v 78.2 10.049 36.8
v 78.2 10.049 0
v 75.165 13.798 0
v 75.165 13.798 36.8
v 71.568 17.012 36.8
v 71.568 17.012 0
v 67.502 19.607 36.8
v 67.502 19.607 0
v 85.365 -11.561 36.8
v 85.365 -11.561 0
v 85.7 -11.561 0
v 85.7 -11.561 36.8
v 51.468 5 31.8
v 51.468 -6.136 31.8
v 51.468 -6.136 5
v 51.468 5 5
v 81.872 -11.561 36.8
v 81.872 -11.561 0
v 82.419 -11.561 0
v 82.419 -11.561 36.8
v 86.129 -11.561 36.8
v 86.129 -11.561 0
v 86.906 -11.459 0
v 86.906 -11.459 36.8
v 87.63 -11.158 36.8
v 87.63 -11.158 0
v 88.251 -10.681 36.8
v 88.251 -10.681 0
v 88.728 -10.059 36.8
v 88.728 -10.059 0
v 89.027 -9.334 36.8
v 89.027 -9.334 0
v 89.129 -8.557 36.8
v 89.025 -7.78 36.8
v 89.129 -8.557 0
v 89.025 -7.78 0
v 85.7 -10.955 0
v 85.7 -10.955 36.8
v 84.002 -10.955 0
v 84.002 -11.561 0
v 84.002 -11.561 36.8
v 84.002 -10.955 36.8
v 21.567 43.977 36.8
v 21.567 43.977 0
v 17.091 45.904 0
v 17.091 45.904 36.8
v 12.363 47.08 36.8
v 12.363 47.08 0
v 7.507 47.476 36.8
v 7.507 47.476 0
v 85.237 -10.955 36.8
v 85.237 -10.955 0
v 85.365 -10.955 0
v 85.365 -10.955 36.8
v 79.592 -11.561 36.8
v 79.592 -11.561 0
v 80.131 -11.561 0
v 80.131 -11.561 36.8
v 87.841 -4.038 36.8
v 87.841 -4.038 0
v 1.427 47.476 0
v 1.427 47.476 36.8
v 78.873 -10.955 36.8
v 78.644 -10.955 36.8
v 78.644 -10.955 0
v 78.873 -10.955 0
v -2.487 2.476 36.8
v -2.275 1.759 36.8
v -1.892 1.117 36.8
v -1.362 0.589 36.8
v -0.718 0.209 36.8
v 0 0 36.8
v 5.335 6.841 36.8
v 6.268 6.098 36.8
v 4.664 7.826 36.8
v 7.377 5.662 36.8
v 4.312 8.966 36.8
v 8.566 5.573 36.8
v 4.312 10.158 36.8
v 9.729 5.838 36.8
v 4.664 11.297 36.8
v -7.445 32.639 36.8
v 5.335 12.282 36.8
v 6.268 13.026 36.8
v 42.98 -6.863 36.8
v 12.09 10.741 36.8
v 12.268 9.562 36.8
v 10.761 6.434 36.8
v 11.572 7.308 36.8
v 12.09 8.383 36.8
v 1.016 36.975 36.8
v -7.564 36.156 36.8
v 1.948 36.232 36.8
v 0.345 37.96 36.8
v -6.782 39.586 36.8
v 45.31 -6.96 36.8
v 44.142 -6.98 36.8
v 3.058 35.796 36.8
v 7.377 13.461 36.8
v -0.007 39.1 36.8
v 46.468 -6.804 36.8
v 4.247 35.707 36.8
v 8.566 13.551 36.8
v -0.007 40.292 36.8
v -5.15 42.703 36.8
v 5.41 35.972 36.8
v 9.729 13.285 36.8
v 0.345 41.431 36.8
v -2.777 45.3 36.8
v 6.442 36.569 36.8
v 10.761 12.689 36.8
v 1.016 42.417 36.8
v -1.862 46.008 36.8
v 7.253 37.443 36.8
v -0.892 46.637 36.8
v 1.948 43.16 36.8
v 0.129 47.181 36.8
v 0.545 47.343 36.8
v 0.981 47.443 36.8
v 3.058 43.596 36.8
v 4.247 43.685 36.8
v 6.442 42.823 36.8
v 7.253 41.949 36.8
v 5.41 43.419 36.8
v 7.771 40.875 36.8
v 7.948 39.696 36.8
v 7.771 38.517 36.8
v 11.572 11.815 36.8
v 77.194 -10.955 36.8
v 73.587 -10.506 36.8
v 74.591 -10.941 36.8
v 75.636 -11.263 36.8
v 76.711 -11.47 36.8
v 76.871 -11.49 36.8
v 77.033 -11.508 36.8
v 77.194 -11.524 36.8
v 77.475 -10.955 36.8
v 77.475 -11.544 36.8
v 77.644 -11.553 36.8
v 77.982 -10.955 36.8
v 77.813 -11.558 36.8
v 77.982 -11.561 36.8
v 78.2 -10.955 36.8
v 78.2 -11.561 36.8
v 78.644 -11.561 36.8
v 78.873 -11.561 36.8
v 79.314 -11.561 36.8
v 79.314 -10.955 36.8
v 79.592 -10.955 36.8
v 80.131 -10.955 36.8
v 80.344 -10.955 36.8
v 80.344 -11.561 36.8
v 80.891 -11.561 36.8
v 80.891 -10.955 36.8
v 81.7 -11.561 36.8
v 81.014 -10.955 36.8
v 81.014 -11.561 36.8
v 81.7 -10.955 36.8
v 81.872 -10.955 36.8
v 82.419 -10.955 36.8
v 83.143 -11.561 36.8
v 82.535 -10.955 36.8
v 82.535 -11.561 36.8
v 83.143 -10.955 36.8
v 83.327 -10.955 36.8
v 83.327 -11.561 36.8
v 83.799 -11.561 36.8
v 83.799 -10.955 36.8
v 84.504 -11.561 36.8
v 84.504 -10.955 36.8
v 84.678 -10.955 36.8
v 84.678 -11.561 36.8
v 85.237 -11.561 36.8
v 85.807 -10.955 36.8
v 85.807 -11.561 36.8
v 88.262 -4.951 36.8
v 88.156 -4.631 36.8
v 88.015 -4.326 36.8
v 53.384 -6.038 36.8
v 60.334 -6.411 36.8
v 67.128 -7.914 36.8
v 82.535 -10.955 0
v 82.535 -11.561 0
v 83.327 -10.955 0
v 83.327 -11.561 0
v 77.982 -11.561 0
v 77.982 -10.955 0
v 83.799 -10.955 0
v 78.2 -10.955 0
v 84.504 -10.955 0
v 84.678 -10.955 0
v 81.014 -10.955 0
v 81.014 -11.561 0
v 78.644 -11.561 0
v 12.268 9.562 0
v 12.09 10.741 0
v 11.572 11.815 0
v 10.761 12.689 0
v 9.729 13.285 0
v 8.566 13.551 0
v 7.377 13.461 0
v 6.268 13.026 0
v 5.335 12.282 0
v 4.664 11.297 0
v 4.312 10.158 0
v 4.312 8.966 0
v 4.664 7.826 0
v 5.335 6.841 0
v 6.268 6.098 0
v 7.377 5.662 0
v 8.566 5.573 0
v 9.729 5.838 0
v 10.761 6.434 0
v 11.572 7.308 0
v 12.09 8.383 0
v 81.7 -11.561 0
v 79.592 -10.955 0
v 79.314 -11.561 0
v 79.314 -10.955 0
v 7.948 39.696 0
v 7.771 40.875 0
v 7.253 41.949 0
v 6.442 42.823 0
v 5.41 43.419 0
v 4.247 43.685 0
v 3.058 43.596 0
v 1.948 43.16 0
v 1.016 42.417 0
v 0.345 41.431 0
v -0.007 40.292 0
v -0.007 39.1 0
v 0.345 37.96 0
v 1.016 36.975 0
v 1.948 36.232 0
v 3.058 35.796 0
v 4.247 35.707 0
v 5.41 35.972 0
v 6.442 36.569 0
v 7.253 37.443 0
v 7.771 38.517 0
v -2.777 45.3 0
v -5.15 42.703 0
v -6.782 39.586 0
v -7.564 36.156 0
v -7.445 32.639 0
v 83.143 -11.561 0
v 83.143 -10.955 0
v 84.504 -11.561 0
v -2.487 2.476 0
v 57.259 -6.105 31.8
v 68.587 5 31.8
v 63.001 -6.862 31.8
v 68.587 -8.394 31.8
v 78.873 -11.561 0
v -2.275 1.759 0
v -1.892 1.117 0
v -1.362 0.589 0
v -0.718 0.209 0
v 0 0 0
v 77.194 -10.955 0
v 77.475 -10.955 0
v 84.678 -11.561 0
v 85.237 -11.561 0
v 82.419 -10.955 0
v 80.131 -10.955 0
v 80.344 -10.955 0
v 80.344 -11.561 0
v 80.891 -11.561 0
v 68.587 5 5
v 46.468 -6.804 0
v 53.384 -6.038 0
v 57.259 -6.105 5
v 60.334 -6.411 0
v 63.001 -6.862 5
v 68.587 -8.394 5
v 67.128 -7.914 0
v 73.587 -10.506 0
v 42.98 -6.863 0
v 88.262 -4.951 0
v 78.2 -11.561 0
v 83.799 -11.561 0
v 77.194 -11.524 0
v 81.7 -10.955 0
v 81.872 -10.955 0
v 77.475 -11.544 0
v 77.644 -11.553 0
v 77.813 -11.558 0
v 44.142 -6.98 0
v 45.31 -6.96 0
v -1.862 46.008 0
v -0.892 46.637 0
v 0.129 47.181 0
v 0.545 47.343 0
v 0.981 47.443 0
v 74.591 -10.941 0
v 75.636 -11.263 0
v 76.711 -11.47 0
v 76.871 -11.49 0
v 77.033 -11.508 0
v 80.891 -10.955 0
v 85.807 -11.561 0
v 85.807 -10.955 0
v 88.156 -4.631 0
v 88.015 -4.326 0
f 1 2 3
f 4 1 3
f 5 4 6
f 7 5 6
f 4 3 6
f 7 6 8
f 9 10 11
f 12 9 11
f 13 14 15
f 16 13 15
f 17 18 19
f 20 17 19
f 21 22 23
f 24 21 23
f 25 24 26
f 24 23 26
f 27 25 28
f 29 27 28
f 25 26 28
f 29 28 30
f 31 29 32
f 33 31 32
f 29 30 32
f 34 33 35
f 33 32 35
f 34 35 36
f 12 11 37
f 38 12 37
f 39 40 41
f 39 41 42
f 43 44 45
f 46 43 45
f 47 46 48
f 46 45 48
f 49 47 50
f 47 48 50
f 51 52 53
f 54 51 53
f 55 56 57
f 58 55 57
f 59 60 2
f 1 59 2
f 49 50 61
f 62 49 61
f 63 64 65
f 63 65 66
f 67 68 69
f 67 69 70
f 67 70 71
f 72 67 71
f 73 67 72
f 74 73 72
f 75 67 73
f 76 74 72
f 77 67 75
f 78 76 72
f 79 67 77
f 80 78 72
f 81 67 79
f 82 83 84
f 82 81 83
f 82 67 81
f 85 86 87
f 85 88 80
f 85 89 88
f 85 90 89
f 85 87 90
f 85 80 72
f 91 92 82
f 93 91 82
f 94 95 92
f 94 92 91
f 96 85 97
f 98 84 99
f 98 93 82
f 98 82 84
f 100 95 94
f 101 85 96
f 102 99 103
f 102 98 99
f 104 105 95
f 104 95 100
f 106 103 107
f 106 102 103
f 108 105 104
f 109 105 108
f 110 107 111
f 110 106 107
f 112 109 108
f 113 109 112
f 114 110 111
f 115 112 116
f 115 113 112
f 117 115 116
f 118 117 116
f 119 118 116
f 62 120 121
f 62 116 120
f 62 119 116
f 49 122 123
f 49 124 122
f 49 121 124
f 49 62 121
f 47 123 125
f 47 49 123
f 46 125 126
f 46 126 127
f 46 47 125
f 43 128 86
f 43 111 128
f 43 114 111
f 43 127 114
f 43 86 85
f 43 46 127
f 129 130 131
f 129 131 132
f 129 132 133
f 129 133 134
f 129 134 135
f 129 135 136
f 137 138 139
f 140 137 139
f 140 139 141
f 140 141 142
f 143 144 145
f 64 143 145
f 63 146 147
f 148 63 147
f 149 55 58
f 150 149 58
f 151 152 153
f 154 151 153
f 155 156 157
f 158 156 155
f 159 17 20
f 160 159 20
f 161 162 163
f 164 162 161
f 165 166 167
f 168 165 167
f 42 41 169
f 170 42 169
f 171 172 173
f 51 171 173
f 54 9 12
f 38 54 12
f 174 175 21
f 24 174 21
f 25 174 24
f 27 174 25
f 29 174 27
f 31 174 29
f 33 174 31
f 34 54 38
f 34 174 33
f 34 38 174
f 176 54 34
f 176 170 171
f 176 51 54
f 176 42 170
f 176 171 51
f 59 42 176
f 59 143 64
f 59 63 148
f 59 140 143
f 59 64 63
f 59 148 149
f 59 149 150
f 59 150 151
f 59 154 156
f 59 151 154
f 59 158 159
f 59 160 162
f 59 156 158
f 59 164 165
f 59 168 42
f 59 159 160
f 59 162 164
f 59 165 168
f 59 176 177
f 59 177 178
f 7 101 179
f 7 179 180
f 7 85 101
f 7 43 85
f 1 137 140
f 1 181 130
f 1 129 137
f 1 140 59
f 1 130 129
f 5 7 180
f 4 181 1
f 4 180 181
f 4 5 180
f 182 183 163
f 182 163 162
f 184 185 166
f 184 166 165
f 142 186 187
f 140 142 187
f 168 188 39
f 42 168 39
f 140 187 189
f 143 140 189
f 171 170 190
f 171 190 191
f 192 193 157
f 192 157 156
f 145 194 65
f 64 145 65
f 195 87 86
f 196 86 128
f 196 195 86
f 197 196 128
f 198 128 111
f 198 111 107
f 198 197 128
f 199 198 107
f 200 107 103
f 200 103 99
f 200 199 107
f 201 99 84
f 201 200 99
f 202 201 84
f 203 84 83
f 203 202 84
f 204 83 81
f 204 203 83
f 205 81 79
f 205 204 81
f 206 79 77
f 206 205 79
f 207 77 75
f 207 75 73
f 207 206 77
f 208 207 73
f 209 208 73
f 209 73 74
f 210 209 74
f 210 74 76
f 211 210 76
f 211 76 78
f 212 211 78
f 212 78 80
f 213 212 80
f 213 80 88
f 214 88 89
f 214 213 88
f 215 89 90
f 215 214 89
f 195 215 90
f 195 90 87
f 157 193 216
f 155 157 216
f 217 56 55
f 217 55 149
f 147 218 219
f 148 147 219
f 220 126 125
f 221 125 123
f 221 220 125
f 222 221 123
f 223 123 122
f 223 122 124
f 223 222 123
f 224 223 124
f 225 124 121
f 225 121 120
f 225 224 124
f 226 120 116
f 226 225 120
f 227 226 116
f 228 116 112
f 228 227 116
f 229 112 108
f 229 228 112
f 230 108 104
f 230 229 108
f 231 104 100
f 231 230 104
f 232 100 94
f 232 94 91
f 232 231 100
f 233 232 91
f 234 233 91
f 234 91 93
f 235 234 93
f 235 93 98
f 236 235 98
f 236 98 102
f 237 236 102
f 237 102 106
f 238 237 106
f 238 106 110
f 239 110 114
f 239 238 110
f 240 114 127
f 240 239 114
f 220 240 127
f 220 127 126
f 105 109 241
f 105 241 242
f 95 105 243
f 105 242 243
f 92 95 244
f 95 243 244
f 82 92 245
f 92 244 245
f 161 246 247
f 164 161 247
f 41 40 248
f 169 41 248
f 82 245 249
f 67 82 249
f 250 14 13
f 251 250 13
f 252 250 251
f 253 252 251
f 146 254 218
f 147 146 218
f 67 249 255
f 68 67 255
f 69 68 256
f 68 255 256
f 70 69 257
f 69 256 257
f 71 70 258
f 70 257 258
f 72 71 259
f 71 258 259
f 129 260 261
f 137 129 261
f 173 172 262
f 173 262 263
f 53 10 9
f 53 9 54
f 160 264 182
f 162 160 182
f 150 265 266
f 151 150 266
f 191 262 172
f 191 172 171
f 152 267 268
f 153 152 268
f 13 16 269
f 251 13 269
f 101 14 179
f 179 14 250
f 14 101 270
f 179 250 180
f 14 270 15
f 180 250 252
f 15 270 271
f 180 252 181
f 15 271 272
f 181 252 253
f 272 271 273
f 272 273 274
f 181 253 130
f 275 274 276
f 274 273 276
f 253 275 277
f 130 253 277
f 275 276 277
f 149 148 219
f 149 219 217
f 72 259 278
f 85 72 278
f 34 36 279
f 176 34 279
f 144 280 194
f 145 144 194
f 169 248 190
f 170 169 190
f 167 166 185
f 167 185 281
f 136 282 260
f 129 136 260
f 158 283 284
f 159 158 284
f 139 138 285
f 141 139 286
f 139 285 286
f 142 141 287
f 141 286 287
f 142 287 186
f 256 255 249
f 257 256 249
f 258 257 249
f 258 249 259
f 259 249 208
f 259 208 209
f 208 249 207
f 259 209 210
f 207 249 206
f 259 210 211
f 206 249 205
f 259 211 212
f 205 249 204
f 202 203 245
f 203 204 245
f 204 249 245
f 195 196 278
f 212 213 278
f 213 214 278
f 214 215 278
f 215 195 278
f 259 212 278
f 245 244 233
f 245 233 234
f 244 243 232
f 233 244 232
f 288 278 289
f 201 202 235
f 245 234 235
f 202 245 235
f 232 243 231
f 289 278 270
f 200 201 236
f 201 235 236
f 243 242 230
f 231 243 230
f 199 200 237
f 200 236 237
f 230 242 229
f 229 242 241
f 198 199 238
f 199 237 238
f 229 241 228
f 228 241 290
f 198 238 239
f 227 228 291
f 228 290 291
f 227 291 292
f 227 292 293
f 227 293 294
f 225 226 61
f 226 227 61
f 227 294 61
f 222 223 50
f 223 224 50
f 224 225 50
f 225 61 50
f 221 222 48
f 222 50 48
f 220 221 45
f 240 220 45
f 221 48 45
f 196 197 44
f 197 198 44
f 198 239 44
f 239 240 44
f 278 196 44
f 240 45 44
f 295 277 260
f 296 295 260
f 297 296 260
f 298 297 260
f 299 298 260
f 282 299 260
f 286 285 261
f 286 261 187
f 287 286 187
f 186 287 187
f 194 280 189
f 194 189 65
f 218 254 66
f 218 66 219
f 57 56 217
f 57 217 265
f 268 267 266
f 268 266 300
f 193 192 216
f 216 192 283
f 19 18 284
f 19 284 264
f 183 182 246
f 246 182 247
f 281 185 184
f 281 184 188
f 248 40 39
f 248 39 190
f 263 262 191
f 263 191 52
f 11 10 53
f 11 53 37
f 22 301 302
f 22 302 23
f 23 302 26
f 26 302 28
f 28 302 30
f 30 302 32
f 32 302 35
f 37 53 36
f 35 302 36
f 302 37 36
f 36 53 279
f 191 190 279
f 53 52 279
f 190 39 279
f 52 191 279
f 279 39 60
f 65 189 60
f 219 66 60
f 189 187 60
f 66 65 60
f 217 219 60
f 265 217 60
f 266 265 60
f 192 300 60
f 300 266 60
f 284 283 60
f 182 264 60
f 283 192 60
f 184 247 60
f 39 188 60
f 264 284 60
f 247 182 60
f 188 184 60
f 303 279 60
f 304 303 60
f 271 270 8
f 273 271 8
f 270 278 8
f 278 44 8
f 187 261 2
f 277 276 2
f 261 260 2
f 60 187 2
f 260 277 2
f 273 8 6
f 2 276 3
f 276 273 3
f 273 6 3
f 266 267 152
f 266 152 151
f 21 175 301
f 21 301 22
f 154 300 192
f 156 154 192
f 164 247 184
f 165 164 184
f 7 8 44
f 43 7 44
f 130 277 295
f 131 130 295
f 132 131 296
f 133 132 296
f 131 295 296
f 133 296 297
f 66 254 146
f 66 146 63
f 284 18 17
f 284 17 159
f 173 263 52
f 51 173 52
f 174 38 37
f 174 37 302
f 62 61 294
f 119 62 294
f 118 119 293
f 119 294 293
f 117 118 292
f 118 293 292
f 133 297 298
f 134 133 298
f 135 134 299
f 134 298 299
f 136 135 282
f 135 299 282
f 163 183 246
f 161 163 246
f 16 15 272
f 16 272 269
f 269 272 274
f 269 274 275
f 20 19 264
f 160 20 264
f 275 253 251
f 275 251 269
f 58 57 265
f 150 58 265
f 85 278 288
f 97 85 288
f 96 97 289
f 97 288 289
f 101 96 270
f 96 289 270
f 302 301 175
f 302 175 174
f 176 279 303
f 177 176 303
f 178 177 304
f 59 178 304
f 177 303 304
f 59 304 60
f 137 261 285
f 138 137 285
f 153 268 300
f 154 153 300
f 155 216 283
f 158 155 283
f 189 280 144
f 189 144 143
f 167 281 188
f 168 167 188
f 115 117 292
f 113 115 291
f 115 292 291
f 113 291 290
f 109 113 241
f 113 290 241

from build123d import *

# Parameters (mm, degrees)
SKETCH1_R           = 4
SKETCH1_W           = 0.443674292
SKETCH1_H           = 0.606573965
SKETCH1_W_2         = 0.441272097
SKETCH1_W_3         = 0.539332563
SKETCH1_W_4         = 0.547504268
SKETCH1_W_5         = 0.686423262
SKETCH1_W_6         = 0.607984695
SKETCH1_W_7         = 0.472854348
SKETCH1_W_8         = 0.501804613
SKETCH1_W_9         = 0.559705146
SKETCH1_W_10        = 0.321886919
SKETCH1_W_11        = 0.335329484
BOSS_EXTRUDE1_DEPTH = 36.8
SKETCH2_W           = 17.119195375
SKETCH2_H           = 26.8
CUT_EXTRUDE1_DEPTH  = 45


with BuildPart() as part:
    # Sketch1 → Boss-Extrude1 (new body)
    with BuildSketch(Plane.XY):
        with BuildLine():
            ThreePointArc((-2.487228681, 2.47588145), (-1.643417841, 0.836304882), (0, 0))
            Line((0, 0), (42.98, -6.863043607))
            ThreePointArc((42.98, -6.863043607), (44.726436776, -6.986706153), (46.46767433, -6.803879411))
            ThreePointArc((46.46767433, -6.803879411), (60.333502735, -6.411334854), (73.586869705, -10.505666612))
            ThreePointArc((73.586869705, -10.505666612), (75.109024375, -11.116277731), (76.710514264, -11.469874834))
            Line((76.710514264, -11.469874834), (76.710514264, -10.954571675))
            Line((76.710514264, -10.954571675), (77.19406036, -10.954571675))
            Line((77.19406036, -10.954571675), (77.47538128, -10.954571675))
            Line((77.47538128, -10.954571675), (77.981998439, -10.954571675))
            Line((77.981998439, -10.954571675), (78.200260874, -10.954571675))
            Line((78.200260874, -10.954571675), (78.643935166, -10.954571675))
            Line((78.643935166, -10.954571675), (78.872742919, -10.954571675))
            Line((78.872742919, -10.954571675), (79.314015016, -10.954571675))
            Line((79.314015016, -10.954571675), (79.591853003, -10.954571675))
            Line((79.591853003, -10.954571675), (80.131185566, -10.954571675))
            Line((80.131185566, -10.954571675), (80.343649909, -10.954571675))
            Line((80.343649909, -10.954571675), (80.891154177, -10.954571675))
            Line((80.891154177, -10.954571675), (81.013729759, -10.954571675))
            Line((81.013729759, -10.954571675), (81.700153021, -10.954571675))
            Line((81.700153021, -10.954571675), (81.871758836, -10.954571675))
            Line((81.871758836, -10.954571675), (82.419263104, -10.954571675))
            Line((82.419263104, -10.954571675), (82.535057995, -10.954571675))
            Line((82.535057995, -10.954571675), (83.14304269, -10.954571675))
            Line((83.14304269, -10.954571675), (83.326547781, -10.954571675))
            Line((83.326547781, -10.954571675), (83.799402129, -10.954571675))
            Line((83.799402129, -10.954571675), (84.002053992, -10.954571675))
            Line((84.002053992, -10.954571675), (84.503858605, -10.954571675))
            Line((84.503858605, -10.954571675), (84.677560202, -10.954571675))
            Line((84.677560202, -10.954571675), (85.237265348, -10.954571675))
            Line((85.237265348, -10.954571675), (85.365140123, -10.954571675))
            Line((85.365140123, -10.954571675), (85.700469607, -10.954571675))
            Line((85.700469607, -10.954571675), (85.806620583, -10.954571675))
            Line((85.806620583, -10.954571675), (86.128507502, -10.954571675))
            Line((86.128507502, -10.954571675), (86.128507502, -11.56114564))
            ThreePointArc((86.128507502, -11.56114564), (88.510189101, -10.385314701), (89.024900759, -7.779540815))
            Line((89.024900759, -7.779540815), (88.261533379, -4.950730067))
            ThreePointArc((88.261533379, -4.950730067), (88.089699744, -4.476637927), (87.840885143, -4.038024828))
            Line((87.840885143, -4.038024828), (78.200260874, 10.048964336))
            ThreePointArc((78.200260874, 10.048964336), (73.431103782, 15.477008911), (67.502436306, 19.607315102))
            Line((67.502436306, 19.607315102), (21.566587187, 43.977332864))
            ThreePointArc((21.566587187, 43.977332864), (14.751147415, 46.588108627), (7.506961555, 47.47588145))
            Line((7.506961555, 47.47588145), (1.426961555, 47.47588145))
            ThreePointArc((1.426961555, 47.47588145), (0.761339604, 47.401107495), (0.128898443, 47.180513062))
            ThreePointArc((0.128898443, 47.180513062), (-1.383603673, 46.332621816), (-2.77660534, 45.300086793))
            ThreePointArc((-2.77660534, 45.300086793), (-6.782062218, 39.585860112), (-7.445250004, 32.639188007))
            Line((-7.445250004, 32.639188007), (-2.487228681, 2.47588145))
        make_face()
        with Locations((8.267526818, 9.561727541)):
            Circle(SKETCH1_R, mode=Mode.SUBTRACT)
        with Locations((3.948380067, 39.69588145)):
            Circle(SKETCH1_R, mode=Mode.SUBTRACT)
        with BuildLine():
            Line((76.710514264, -10.954571675), (76.710514264, -11.469874834))
            ThreePointArc((76.710514264, -11.469874834), (76.951959843, -11.499734689), (77.19406036, -11.523712134))
            Line((77.19406036, -11.523712134), (77.19406036, -10.954571675))
            Line((77.19406036, -10.954571675), (76.710514264, -10.954571675))
        make_face()
        with BuildLine():
            Line((77.47538128, -10.954571675), (77.47538128, -11.544129353))
            ThreePointArc((77.47538128, -11.544129353), (77.728583879, -11.555701678), (77.981998439, -11.560852954))
            Line((77.981998439, -11.560852954), (77.981998439, -10.954571675))
            Line((77.981998439, -10.954571675), (77.47538128, -10.954571675))
        make_face()
        with Locations((78.42209802, -11.257858658)):
            Rectangle(SKETCH1_W, SKETCH1_H)
        with Locations((79.093378968, -11.257858658)):
            Rectangle(SKETCH1_W_2, SKETCH1_H)
        with Locations((79.861519285, -11.257858658)):
            Rectangle(SKETCH1_W_3, SKETCH1_H)
        with Locations((80.617402043, -11.257858658)):
            Rectangle(SKETCH1_W_4, SKETCH1_H)
        with Locations((81.35694139, -11.257858658)):
            Rectangle(SKETCH1_W_5, SKETCH1_H)
        with Locations((82.14551097, -11.257858658)):
            Rectangle(SKETCH1_W_4, SKETCH1_H)
        with Locations((82.839050343, -11.257858658)):
            Rectangle(SKETCH1_W_6, SKETCH1_H)
        with Locations((83.562974955, -11.257858658)):
            Rectangle(SKETCH1_W_7, SKETCH1_H)
        with Locations((84.252956299, -11.257858658)):
            Rectangle(SKETCH1_W_8, SKETCH1_H)
        with Locations((84.957412775, -11.257858658)):
            Rectangle(SKETCH1_W_9, SKETCH1_H)
        with Locations((85.967564043, -11.257858658)):
            Rectangle(SKETCH1_W_10, SKETCH1_H)
        with Locations((85.532804865, -11.257858658)):
            Rectangle(SKETCH1_W_11, SKETCH1_H)
    extrude(amount=BOSS_EXTRUDE1_DEPTH)

    # Sketch2 → Cut-Extrude1 (cut)
    with BuildSketch(Plane(origin=(0, -40, 0), x_dir=(1, 0, 0), z_dir=(0, 1, 0))):
        with Locations((60.027272017, -18.4)):
            Rectangle(SKETCH2_W, SKETCH2_H)
    extrude(amount=CUT_EXTRUDE1_DEPTH, mode=Mode.SUBTRACT)


solid = part.part
